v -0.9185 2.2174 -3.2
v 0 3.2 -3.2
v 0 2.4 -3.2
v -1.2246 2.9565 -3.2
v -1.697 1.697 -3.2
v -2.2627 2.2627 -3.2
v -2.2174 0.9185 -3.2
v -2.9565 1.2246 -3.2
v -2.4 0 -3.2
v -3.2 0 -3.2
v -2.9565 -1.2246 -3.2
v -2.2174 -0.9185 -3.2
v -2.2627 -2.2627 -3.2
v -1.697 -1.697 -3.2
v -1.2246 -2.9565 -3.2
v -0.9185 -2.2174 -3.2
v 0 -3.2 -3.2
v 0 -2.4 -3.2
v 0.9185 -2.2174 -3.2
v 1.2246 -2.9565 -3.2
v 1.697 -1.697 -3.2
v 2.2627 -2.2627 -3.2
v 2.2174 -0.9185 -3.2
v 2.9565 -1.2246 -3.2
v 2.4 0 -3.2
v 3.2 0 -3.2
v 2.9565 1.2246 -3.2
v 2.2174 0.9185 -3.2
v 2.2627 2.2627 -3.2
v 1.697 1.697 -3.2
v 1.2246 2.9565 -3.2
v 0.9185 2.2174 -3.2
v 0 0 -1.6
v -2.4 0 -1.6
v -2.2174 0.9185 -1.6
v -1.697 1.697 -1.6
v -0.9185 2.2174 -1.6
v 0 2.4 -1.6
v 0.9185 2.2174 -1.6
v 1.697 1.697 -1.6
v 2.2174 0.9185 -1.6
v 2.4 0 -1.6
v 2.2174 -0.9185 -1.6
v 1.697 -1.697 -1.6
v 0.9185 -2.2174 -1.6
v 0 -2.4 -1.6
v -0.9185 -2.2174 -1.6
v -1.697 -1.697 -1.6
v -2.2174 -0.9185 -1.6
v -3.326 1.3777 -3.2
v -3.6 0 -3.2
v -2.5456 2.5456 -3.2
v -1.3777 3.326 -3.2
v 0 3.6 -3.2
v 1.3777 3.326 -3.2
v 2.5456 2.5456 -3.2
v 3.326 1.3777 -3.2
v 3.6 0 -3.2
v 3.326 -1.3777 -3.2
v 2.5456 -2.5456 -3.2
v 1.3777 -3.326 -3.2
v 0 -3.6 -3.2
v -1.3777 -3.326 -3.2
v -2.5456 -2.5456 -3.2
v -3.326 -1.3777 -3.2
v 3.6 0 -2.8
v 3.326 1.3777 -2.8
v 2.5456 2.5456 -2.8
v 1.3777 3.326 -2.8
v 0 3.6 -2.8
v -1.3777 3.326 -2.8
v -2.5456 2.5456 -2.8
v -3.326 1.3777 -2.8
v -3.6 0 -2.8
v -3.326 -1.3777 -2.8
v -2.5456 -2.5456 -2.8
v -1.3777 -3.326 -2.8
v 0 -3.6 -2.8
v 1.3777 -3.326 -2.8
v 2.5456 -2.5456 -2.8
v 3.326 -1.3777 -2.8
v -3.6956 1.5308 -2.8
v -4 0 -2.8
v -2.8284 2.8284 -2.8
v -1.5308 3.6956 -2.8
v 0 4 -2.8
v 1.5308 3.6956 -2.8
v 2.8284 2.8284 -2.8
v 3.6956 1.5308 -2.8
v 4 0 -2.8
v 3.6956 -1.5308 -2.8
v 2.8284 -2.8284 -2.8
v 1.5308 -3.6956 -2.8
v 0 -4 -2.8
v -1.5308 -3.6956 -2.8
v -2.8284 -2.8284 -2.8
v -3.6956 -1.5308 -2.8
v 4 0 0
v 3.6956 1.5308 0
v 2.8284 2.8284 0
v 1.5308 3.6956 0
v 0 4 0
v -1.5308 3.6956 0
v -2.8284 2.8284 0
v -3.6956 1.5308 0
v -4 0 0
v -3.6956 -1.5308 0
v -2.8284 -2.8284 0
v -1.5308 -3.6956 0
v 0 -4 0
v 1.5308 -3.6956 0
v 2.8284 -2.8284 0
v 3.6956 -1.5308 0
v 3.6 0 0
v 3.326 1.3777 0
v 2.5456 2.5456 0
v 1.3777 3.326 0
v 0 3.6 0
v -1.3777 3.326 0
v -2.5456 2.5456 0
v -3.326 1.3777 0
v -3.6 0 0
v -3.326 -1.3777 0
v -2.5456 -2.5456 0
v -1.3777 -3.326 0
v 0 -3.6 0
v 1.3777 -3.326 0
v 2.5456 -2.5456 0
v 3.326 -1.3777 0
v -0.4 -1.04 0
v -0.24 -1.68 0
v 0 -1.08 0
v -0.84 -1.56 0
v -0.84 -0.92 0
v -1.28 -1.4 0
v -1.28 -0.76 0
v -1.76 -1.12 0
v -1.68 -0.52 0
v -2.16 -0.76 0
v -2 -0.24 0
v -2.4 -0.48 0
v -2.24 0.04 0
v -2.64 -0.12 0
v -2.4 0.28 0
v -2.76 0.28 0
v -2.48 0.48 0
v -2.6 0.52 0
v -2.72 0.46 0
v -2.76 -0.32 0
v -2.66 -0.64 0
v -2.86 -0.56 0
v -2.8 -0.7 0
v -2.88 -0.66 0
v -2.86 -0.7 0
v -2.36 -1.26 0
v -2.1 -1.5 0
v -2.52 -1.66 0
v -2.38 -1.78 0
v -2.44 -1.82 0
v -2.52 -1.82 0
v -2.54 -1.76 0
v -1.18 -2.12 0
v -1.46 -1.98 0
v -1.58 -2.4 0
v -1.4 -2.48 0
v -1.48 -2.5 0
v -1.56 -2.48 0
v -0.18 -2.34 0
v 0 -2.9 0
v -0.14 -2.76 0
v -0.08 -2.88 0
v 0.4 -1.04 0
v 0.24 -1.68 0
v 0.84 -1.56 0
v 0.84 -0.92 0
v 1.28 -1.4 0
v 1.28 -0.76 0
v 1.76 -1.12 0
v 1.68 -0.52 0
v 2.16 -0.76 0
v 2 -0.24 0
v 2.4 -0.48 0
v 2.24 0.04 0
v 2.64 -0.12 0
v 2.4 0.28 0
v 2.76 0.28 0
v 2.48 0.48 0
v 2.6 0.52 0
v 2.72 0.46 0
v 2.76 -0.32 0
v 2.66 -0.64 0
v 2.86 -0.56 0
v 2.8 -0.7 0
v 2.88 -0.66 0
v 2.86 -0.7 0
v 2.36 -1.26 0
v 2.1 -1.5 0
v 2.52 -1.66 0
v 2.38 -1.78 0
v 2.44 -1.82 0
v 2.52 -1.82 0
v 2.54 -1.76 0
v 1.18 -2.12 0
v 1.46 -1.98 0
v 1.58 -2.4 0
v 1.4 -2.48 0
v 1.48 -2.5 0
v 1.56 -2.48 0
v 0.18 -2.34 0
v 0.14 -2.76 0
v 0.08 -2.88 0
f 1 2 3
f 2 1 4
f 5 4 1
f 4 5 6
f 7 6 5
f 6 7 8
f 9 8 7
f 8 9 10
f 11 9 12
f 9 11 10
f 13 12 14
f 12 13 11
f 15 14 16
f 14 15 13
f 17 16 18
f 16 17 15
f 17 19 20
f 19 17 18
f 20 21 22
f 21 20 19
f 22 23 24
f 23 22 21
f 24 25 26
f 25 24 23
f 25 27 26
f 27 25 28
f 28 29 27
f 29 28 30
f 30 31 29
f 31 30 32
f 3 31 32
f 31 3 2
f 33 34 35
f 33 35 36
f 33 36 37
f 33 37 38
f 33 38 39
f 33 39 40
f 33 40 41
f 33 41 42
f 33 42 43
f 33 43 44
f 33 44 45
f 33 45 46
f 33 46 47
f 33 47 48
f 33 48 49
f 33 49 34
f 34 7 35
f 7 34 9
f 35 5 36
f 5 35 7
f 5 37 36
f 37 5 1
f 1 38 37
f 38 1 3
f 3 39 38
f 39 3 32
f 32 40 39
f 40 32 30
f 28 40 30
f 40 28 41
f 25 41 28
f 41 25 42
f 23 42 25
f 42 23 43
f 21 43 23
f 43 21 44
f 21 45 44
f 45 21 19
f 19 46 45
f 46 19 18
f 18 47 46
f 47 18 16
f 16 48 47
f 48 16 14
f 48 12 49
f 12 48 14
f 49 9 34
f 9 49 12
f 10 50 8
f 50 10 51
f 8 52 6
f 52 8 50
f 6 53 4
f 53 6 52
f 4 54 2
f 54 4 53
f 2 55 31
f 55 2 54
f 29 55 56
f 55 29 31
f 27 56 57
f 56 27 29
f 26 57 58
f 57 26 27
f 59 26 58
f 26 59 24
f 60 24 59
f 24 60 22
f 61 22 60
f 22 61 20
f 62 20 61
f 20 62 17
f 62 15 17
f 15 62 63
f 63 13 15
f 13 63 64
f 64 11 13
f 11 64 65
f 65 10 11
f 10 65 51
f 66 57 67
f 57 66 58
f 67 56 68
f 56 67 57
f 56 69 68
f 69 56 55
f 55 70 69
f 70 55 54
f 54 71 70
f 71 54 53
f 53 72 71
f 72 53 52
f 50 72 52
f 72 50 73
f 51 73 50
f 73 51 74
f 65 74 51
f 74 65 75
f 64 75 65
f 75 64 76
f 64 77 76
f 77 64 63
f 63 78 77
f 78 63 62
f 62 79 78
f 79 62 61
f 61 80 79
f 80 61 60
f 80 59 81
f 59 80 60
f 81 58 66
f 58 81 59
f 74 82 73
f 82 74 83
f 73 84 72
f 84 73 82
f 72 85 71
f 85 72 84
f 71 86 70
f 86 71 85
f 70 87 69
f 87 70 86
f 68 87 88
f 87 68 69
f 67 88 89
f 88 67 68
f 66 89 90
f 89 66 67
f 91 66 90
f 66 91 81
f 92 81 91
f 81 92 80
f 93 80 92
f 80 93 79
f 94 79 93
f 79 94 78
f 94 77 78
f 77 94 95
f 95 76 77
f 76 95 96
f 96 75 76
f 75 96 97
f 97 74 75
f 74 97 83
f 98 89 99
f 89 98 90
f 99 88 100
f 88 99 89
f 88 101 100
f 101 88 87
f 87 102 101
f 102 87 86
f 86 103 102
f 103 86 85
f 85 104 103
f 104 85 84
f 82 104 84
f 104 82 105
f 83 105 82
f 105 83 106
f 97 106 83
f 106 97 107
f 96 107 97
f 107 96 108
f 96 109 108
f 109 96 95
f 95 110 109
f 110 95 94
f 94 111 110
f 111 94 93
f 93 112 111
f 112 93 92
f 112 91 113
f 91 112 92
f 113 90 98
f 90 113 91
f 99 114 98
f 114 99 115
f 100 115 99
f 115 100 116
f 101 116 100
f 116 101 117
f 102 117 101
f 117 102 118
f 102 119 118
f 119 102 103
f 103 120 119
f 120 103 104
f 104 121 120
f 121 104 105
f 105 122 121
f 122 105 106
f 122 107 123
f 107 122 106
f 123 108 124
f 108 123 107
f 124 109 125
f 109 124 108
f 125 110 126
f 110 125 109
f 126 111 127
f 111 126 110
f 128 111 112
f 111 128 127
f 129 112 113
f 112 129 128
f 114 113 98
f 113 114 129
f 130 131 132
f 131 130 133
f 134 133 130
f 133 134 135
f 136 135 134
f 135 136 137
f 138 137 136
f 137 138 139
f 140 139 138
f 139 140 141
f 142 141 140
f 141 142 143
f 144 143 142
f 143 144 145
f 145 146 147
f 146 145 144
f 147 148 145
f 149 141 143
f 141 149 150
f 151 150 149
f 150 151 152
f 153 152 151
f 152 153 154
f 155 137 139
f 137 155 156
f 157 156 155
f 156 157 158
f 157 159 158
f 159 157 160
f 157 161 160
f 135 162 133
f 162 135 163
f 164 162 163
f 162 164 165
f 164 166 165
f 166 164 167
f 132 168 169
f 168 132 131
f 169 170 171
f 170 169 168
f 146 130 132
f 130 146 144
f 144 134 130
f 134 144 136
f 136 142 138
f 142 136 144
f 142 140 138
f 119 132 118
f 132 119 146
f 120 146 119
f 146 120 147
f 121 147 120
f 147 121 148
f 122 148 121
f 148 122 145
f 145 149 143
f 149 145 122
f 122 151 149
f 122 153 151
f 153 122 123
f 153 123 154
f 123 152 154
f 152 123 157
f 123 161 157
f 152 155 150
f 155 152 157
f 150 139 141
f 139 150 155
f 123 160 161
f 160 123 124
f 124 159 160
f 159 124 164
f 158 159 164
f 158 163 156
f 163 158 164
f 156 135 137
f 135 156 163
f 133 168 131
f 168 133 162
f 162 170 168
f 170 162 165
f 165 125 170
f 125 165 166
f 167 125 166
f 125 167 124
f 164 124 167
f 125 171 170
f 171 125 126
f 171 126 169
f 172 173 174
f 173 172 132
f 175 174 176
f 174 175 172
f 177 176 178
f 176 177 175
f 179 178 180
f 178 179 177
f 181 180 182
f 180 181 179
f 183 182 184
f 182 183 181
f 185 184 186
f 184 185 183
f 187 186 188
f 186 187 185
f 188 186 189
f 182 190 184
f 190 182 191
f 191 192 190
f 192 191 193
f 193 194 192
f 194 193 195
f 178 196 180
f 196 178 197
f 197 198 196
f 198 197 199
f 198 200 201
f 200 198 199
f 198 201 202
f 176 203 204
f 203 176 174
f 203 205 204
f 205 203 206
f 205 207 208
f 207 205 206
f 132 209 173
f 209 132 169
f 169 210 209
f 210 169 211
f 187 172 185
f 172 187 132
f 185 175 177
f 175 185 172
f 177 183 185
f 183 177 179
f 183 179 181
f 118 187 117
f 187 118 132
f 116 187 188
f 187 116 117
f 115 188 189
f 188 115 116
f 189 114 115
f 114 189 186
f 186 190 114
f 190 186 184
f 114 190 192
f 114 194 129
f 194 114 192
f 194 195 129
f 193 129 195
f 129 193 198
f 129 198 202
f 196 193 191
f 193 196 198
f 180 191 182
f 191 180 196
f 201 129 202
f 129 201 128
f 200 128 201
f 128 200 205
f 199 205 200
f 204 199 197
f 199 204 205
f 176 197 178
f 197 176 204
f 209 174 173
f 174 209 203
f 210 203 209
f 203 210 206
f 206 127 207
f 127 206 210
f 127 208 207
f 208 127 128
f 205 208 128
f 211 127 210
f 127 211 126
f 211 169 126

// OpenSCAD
use <../lib.scad>
use <../p/4-4ering.scad>
use <s/98138s01.scad>
$fa=1; $fs=0.2;
function ldraw_lib__98138p0c(realsolid=false) = [
// 0 Tile  1 x  1 Round with Eye Closed Pattern
// 0 Name: 98138p0c.dat
// 0 Author: Philippe Hurbain [Philo]
// 0 !LDRAW_ORG Part UPDATE 2015-01
// 0 !LICENSE Licensed under CC BY 2.0 and CC BY 4.0 : see CAreadme.txt
// 
// 0 BFC CERTIFY CCW
  [0,"BFC","CERTIFY"],
  [0,"BFC","CCW"],
// 
// 0 !KEYWORDS Eyelash
// 
// 0 !HISTORY 2015-10-11 [PTadmin] Official Update 2015-01
// 
// 
// 1 16 0 0 0 1 0 0 0 1 0 0 0 1 s\98138s01.dat
  [1,16,0,0,0,1,0,0,0,1,0,0,0,1, ldraw_lib__s__98138s01(realsolid)],
// 1 16 0 0 0 9 0 0 0 1 0 0 0 9 4-4ering.dat
  [1,16,0,0,0,9,0,0,0,1,0,0,0,9, ldraw_lib__4_4ering(realsolid)],
// 4 0 -0.6 0 -4.2 0 0 -2.7 -1 0 -2.6 -2.1 0 -3.9
  [4,0,-0.6,0,-4.2,0,0,-2.7,-1,0,-2.6,-2.1,0,-3.9],
// 4 0 -2.1 0 -3.9 -1 0 -2.6 -2.1 0 -2.3 -3.2 0 -3.5
  [4,0,-2.1,0,-3.9,-1,0,-2.6,-2.1,0,-2.3,-3.2,0,-3.5],
// 4 0 -3.2 0 -3.5 -2.1 0 -2.3 -3.2 0 -1.9 -4.4 0 -2.8
  [4,0,-3.2,0,-3.5,-2.1,0,-2.3,-3.2,0,-1.9,-4.4,0,-2.8],
// 4 0 -4.4 0 -2.8 -3.2 0 -1.9 -4.2 0 -1.3 -5.4 0 -1.9
  [4,0,-4.4,0,-2.8,-3.2,0,-1.9,-4.2,0,-1.3,-5.4,0,-1.9],
// 4 0 -5.4 0 -1.9 -4.2 0 -1.3 -5 0 -0.6 -6 0 -1.2
  [4,0,-5.4,0,-1.9,-4.2,0,-1.3,-5,0,-0.6,-6,0,-1.2],
// 4 0 -6 0 -1.2 -5 0 -0.6 -5.6 0 0.1 -6.6 0 -0.3
  [4,0,-6,0,-1.2,-5,0,-0.6,-5.6,0,0.1,-6.6,0,-0.3],
// 4 0 -6.6 0 -0.3 -5.6 0 0.1 -6 0 0.7 -6.9 0 0.7
  [4,0,-6.6,0,-0.3,-5.6,0,0.1,-6,0,0.7,-6.9,0,0.7],
// 4 0 -6.9 0 0.7 -6 0 0.7 -6.2 0 1.2 -6.5 0 1.3
  [4,0,-6.9,0,0.7,-6,0,0.7,-6.2,0,1.2,-6.5,0,1.3],
// 3 0 -6.5 0 1.3 -6.8 0 1.15 -6.9 0 0.7
  [3,0,-6.5,0,1.3,-6.8,0,1.15,-6.9,0,0.7],
// 4 0 -6 0 -1.2 -6.6 0 -0.3 -6.9 0 -0.8 -6.65 0 -1.6
  [4,0,-6,0,-1.2,-6.6,0,-0.3,-6.9,0,-0.8,-6.65,0,-1.6],
// 4 0 -6.65 0 -1.6 -6.9 0 -0.8 -7.15 0 -1.4 -7 0 -1.75
  [4,0,-6.65,0,-1.6,-6.9,0,-0.8,-7.15,0,-1.4,-7,0,-1.75],
// 4 0 -7 0 -1.75 -7.15 0 -1.4 -7.2 0 -1.65 -7.15 0 -1.75
  [4,0,-7,0,-1.75,-7.15,0,-1.4,-7.2,0,-1.65,-7.15,0,-1.75],
// 4 0 -4.4 0 -2.8 -5.4 0 -1.9 -5.9 0 -3.15 -5.25 0 -3.75
  [4,0,-4.4,0,-2.8,-5.4,0,-1.9,-5.9,0,-3.15,-5.25,0,-3.75],
// 4 0 -5.25 0 -3.75 -5.9 0 -3.15 -6.3 0 -4.15 -5.95 0 -4.45
  [4,0,-5.25,0,-3.75,-5.9,0,-3.15,-6.3,0,-4.15,-5.95,0,-4.45],
// 4 0 -6.1 0 -4.55 -5.95 0 -4.45 -6.3 0 -4.15 -6.3 0 -4.55
  [4,0,-6.1,0,-4.55,-5.95,0,-4.45,-6.3,0,-4.15,-6.3,0,-4.55],
// 3 0 -6.3 0 -4.15 -6.35 0 -4.4 -6.3 0 -4.55
  [3,0,-6.3,0,-4.15,-6.35,0,-4.4,-6.3,0,-4.55],
// 4 0 -2.1 0 -3.9 -3.2 0 -3.5 -3.65 0 -4.95 -2.95 0 -5.3
  [4,0,-2.1,0,-3.9,-3.2,0,-3.5,-3.65,0,-4.95,-2.95,0,-5.3],
// 4 0 -2.95 0 -5.3 -3.65 0 -4.95 -3.95 0 -6 -3.5 0 -6.2
  [4,0,-2.95,0,-5.3,-3.65,0,-4.95,-3.95,0,-6,-3.5,0,-6.2],
// 4 0 -3.7 0 -6.25 -3.5 0 -6.2 -3.95 0 -6 -3.9 0 -6.2
  [4,0,-3.7,0,-6.25,-3.5,0,-6.2,-3.95,0,-6,-3.9,0,-6.2],
// 4 0 0 0 -2.7 -0.6 0 -4.2 -0.45 0 -5.85 0 0 -7.25
  [4,0,0,0,-2.7,-0.6,0,-4.2,-0.45,0,-5.85,0,0,-7.25],
// 4 0 -0.2 0 -7.2 0 0 -7.25 -0.45 0 -5.85 -0.35 0 -6.9
  [4,0,-0.2,0,-7.2,0,0,-7.25,-0.45,0,-5.85,-0.35,0,-6.9],
// 4 16 0 0 -2.7 -6.2 0 1.2 -6 0 0.7 -1 0 -2.6
  [4,16,0,0,-2.7,-6.2,0,1.2,-6,0,0.7,-1,0,-2.6],
// 4 16 -2.1 0 -2.3 -1 0 -2.6 -6 0 0.7 -3.2 0 -1.9
  [4,16,-2.1,0,-2.3,-1,0,-2.6,-6,0,0.7,-3.2,0,-1.9],
// 4 16 -4.2 0 -1.3 -3.2 0 -1.9 -6 0 0.7 -5.6 0 0.1
  [4,16,-4.2,0,-1.3,-3.2,0,-1.9,-6,0,0.7,-5.6,0,0.1],
// 3 16 -5.6 0 0.1 -5 0 -0.6 -4.2 0 -1.3
  [3,16,-5.6,0,0.1,-5,0,-0.6,-4.2,0,-1.3],
// 4 16 -6.2 0 1.2 0 0 -2.7 0 0 9 -3.4443 0 8.3151
  [4,16,-6.2,0,1.2,0,0,-2.7,0,0,9,-3.4443,0,8.3151],
// 4 16 -6.2 0 1.2 -3.4443 0 8.3151 -6.3639 0 6.3639 -6.5 0 1.3
  [4,16,-6.2,0,1.2,-3.4443,0,8.3151,-6.3639,0,6.3639,-6.5,0,1.3],
// 4 16 -6.5 0 1.3 -6.3639 0 6.3639 -8.3151 0 3.4443 -6.8 0 1.15
  [4,16,-6.5,0,1.3,-6.3639,0,6.3639,-8.3151,0,3.4443,-6.8,0,1.15],
// 4 16 -6.9 0 0.7 -6.8 0 1.15 -8.3151 0 3.4443 -9 0 0
  [4,16,-6.9,0,0.7,-6.8,0,1.15,-8.3151,0,3.4443,-9,0,0],
// 4 16 -6.9 0 0.7 -9 0 0 -6.9 0 -0.8 -6.6 0 -0.3
  [4,16,-6.9,0,0.7,-9,0,0,-6.9,0,-0.8,-6.6,0,-0.3],
// 3 16 -9 0 0 -7.15 0 -1.4 -6.9 0 -0.8
  [3,16,-9,0,0,-7.15,0,-1.4,-6.9,0,-0.8],
// 4 16 -7.2 0 -1.65 -7.15 0 -1.4 -9 0 0 -8.3151 0 -3.4443
  [4,16,-7.2,0,-1.65,-7.15,0,-1.4,-9,0,0,-8.3151,0,-3.4443],
// 3 16 -7.2 0 -1.65 -8.3151 0 -3.4443 -7.15 0 -1.75
  [3,16,-7.2,0,-1.65,-8.3151,0,-3.4443,-7.15,0,-1.75],
// 4 16 -7 0 -1.75 -7.15 0 -1.75 -8.3151 0 -3.4443 -6.3 0 -4.15
  [4,16,-7,0,-1.75,-7.15,0,-1.75,-8.3151,0,-3.4443,-6.3,0,-4.15],
// 3 16 -8.3151 0 -3.4443 -6.35 0 -4.4 -6.3 0 -4.15
  [3,16,-8.3151,0,-3.4443,-6.35,0,-4.4,-6.3,0,-4.15],
// 4 16 -7 0 -1.75 -6.3 0 -4.15 -5.9 0 -3.15 -6.65 0 -1.6
  [4,16,-7,0,-1.75,-6.3,0,-4.15,-5.9,0,-3.15,-6.65,0,-1.6],
// 4 16 -6.65 0 -1.6 -5.9 0 -3.15 -5.4 0 -1.9 -6 0 -1.2
  [4,16,-6.65,0,-1.6,-5.9,0,-3.15,-5.4,0,-1.9,-6,0,-1.2],
// 4 16 -6.3 0 -4.55 -6.35 0 -4.4 -8.3151 0 -3.4443 -6.3639 0 -6.3639
  [4,16,-6.3,0,-4.55,-6.35,0,-4.4,-8.3151,0,-3.4443,-6.3639,0,-6.3639],
// 4 16 -6.1 0 -4.55 -6.3 0 -4.55 -6.3639 0 -6.3639 -3.95 0 -6
  [4,16,-6.1,0,-4.55,-6.3,0,-4.55,-6.3639,0,-6.3639,-3.95,0,-6],
// 3 16 -5.95 0 -4.45 -6.1 0 -4.55 -3.95 0 -6
  [3,16,-5.95,0,-4.45,-6.1,0,-4.55,-3.95,0,-6],
// 4 16 -5.25 0 -3.75 -5.95 0 -4.45 -3.95 0 -6 -3.65 0 -4.95
  [4,16,-5.25,0,-3.75,-5.95,0,-4.45,-3.95,0,-6,-3.65,0,-4.95],
// 4 16 -4.4 0 -2.8 -5.25 0 -3.75 -3.65 0 -4.95 -3.2 0 -3.5
  [4,16,-4.4,0,-2.8,-5.25,0,-3.75,-3.65,0,-4.95,-3.2,0,-3.5],
// 4 16 -0.6 0 -4.2 -2.1 0 -3.9 -2.95 0 -5.3 -0.45 0 -5.85
  [4,16,-0.6,0,-4.2,-2.1,0,-3.9,-2.95,0,-5.3,-0.45,0,-5.85],
// 4 16 -0.35 0 -6.9 -0.45 0 -5.85 -2.95 0 -5.3 -3.5 0 -6.2
  [4,16,-0.35,0,-6.9,-0.45,0,-5.85,-2.95,0,-5.3,-3.5,0,-6.2],
// 4 16 -3.4443 0 -8.3151 -0.35 0 -6.9 -3.5 0 -6.2 -3.7 0 -6.25
  [4,16,-3.4443,0,-8.3151,-0.35,0,-6.9,-3.5,0,-6.2,-3.7,0,-6.25],
// 4 16 -3.4443 0 -8.3151 -3.7 0 -6.25 -3.9 0 -6.2 -6.3639 0 -6.3639
  [4,16,-3.4443,0,-8.3151,-3.7,0,-6.25,-3.9,0,-6.2,-6.3639,0,-6.3639],
// 3 16 -3.95 0 -6 -6.3639 0 -6.3639 -3.9 0 -6.2
  [3,16,-3.95,0,-6,-6.3639,0,-6.3639,-3.9,0,-6.2],
// 4 16 -0.2 0 -7.2 -0.35 0 -6.9 -3.4443 0 -8.3151 0 0 -9
  [4,16,-0.2,0,-7.2,-0.35,0,-6.9,-3.4443,0,-8.3151,0,0,-9],
// 3 16 -0.2 0 -7.2 0 0 -9 0 0 -7.25
  [3,16,-0.2,0,-7.2,0,0,-9,0,0,-7.25],
// 4 0 1 0 -2.6 0 0 -2.7 0.6 0 -4.2 2.1 0 -3.9
  [4,0,1,0,-2.6,0,0,-2.7,0.6,0,-4.2,2.1,0,-3.9],
// 4 0 2.1 0 -2.3 1 0 -2.6 2.1 0 -3.9 3.2 0 -3.5
  [4,0,2.1,0,-2.3,1,0,-2.6,2.1,0,-3.9,3.2,0,-3.5],
// 4 0 3.2 0 -1.9 2.1 0 -2.3 3.2 0 -3.5 4.4 0 -2.8
  [4,0,3.2,0,-1.9,2.1,0,-2.3,3.2,0,-3.5,4.4,0,-2.8],
// 4 0 4.2 0 -1.3 3.2 0 -1.9 4.4 0 -2.8 5.4 0 -1.9
  [4,0,4.2,0,-1.3,3.2,0,-1.9,4.4,0,-2.8,5.4,0,-1.9],
// 4 0 5 0 -0.6 4.2 0 -1.3 5.4 0 -1.9 6 0 -1.2
  [4,0,5,0,-0.6,4.2,0,-1.3,5.4,0,-1.9,6,0,-1.2],
// 4 0 5.6 0 0.1 5 0 -0.6 6 0 -1.2 6.6 0 -0.3
  [4,0,5.6,0,0.1,5,0,-0.6,6,0,-1.2,6.6,0,-0.3],
// 4 0 6 0 0.7 5.6 0 0.1 6.6 0 -0.3 6.9 0 0.7
  [4,0,6,0,0.7,5.6,0,0.1,6.6,0,-0.3,6.9,0,0.7],
// 4 0 6.2 0 1.2 6 0 0.7 6.9 0 0.7 6.5 0 1.3
  [4,0,6.2,0,1.2,6,0,0.7,6.9,0,0.7,6.5,0,1.3],
// 3 0 6.5 0 1.3 6.9 0 0.7 6.8 0 1.15
  [3,0,6.5,0,1.3,6.9,0,0.7,6.8,0,1.15],
// 4 0 6.9 0 -0.8 6.6 0 -0.3 6 0 -1.2 6.65 0 -1.6
  [4,0,6.9,0,-0.8,6.6,0,-0.3,6,0,-1.2,6.65,0,-1.6],
// 4 0 7.15 0 -1.4 6.9 0 -0.8 6.65 0 -1.6 7 0 -1.75
  [4,0,7.15,0,-1.4,6.9,0,-0.8,6.65,0,-1.6,7,0,-1.75],
// 4 0 7.2 0 -1.65 7.15 0 -1.4 7 0 -1.75 7.15 0 -1.75
  [4,0,7.2,0,-1.65,7.15,0,-1.4,7,0,-1.75,7.15,0,-1.75],
// 4 0 5.9 0 -3.15 5.4 0 -1.9 4.4 0 -2.8 5.25 0 -3.75
  [4,0,5.9,0,-3.15,5.4,0,-1.9,4.4,0,-2.8,5.25,0,-3.75],
// 4 0 6.3 0 -4.15 5.9 0 -3.15 5.25 0 -3.75 5.95 0 -4.45
  [4,0,6.3,0,-4.15,5.9,0,-3.15,5.25,0,-3.75,5.95,0,-4.45],
// 4 0 6.3 0 -4.15 5.95 0 -4.45 6.1 0 -4.55 6.3 0 -4.55
  [4,0,6.3,0,-4.15,5.95,0,-4.45,6.1,0,-4.55,6.3,0,-4.55],
// 3 0 6.3 0 -4.15 6.3 0 -4.55 6.35 0 -4.4
  [3,0,6.3,0,-4.15,6.3,0,-4.55,6.35,0,-4.4],
// 4 0 3.65 0 -4.95 3.2 0 -3.5 2.1 0 -3.9 2.95 0 -5.3
  [4,0,3.65,0,-4.95,3.2,0,-3.5,2.1,0,-3.9,2.95,0,-5.3],
// 4 0 3.95 0 -6 3.65 0 -4.95 2.95 0 -5.3 3.5 0 -6.2
  [4,0,3.95,0,-6,3.65,0,-4.95,2.95,0,-5.3,3.5,0,-6.2],
// 4 0 3.95 0 -6 3.5 0 -6.2 3.7 0 -6.25 3.9 0 -6.2
  [4,0,3.95,0,-6,3.5,0,-6.2,3.7,0,-6.25,3.9,0,-6.2],
// 4 0 0.45 0 -5.85 0.6 0 -4.2 0 0 -2.7 0 0 -7.25
  [4,0,0.45,0,-5.85,0.6,0,-4.2,0,0,-2.7,0,0,-7.25],
// 4 0 0.45 0 -5.85 0 0 -7.25 0.2 0 -7.2 0.35 0 -6.9
  [4,0,0.45,0,-5.85,0,0,-7.25,0.2,0,-7.2,0.35,0,-6.9],
// 4 16 6 0 0.7 6.2 0 1.2 0 0 -2.7 1 0 -2.6
  [4,16,6,0,0.7,6.2,0,1.2,0,0,-2.7,1,0,-2.6],
// 4 16 6 0 0.7 1 0 -2.6 2.1 0 -2.3 3.2 0 -1.9
  [4,16,6,0,0.7,1,0,-2.6,2.1,0,-2.3,3.2,0,-1.9],
// 4 16 6 0 0.7 3.2 0 -1.9 4.2 0 -1.3 5.6 0 0.1
  [4,16,6,0,0.7,3.2,0,-1.9,4.2,0,-1.3,5.6,0,0.1],
// 3 16 5.6 0 0.1 4.2 0 -1.3 5 0 -0.6
  [3,16,5.6,0,0.1,4.2,0,-1.3,5,0,-0.6],
// 4 16 0 0 9 0 0 -2.7 6.2 0 1.2 3.4443 0 8.3151
  [4,16,0,0,9,0,0,-2.7,6.2,0,1.2,3.4443,0,8.3151],
// 4 16 6.3639 0 6.3639 3.4443 0 8.3151 6.2 0 1.2 6.5 0 1.3
  [4,16,6.3639,0,6.3639,3.4443,0,8.3151,6.2,0,1.2,6.5,0,1.3],
// 4 16 8.3151 0 3.4443 6.3639 0 6.3639 6.5 0 1.3 6.8 0 1.15
  [4,16,8.3151,0,3.4443,6.3639,0,6.3639,6.5,0,1.3,6.8,0,1.15],
// 4 16 8.3151 0 3.4443 6.8 0 1.15 6.9 0 0.7 9 0 0
  [4,16,8.3151,0,3.4443,6.8,0,1.15,6.9,0,0.7,9,0,0],
// 4 16 6.9 0 -0.8 9 0 0 6.9 0 0.7 6.6 0 -0.3
  [4,16,6.9,0,-0.8,9,0,0,6.9,0,0.7,6.6,0,-0.3],
// 3 16 9 0 0 6.9 0 -0.8 7.15 0 -1.4
  [3,16,9,0,0,6.9,0,-0.8,7.15,0,-1.4],
// 4 16 9 0 0 7.15 0 -1.4 7.2 0 -1.65 8.3151 0 -3.4443
  [4,16,9,0,0,7.15,0,-1.4,7.2,0,-1.65,8.3151,0,-3.4443],
// 3 16 7.2 0 -1.65 7.15 0 -1.75 8.3151 0 -3.4443
  [3,16,7.2,0,-1.65,7.15,0,-1.75,8.3151,0,-3.4443],
// 4 16 8.3151 0 -3.4443 7.15 0 -1.75 7 0 -1.75 6.3 0 -4.15
  [4,16,8.3151,0,-3.4443,7.15,0,-1.75,7,0,-1.75,6.3,0,-4.15],
// 3 16 8.3151 0 -3.4443 6.3 0 -4.15 6.35 0 -4.4
  [3,16,8.3151,0,-3.4443,6.3,0,-4.15,6.35,0,-4.4],
// 4 16 5.9 0 -3.15 6.3 0 -4.15 7 0 -1.75 6.65 0 -1.6
  [4,16,5.9,0,-3.15,6.3,0,-4.15,7,0,-1.75,6.65,0,-1.6],
// 4 16 5.4 0 -1.9 5.9 0 -3.15 6.65 0 -1.6 6 0 -1.2
  [4,16,5.4,0,-1.9,5.9,0,-3.15,6.65,0,-1.6,6,0,-1.2],
// 4 16 8.3151 0 -3.4443 6.35 0 -4.4 6.3 0 -4.55 6.3639 0 -6.3639
  [4,16,8.3151,0,-3.4443,6.35,0,-4.4,6.3,0,-4.55,6.3639,0,-6.3639],
// 4 16 6.3639 0 -6.3639 6.3 0 -4.55 6.1 0 -4.55 3.95 0 -6
  [4,16,6.3639,0,-6.3639,6.3,0,-4.55,6.1,0,-4.55,3.95,0,-6],
// 3 16 5.95 0 -4.45 3.95 0 -6 6.1 0 -4.55
  [3,16,5.95,0,-4.45,3.95,0,-6,6.1,0,-4.55],
// 4 16 3.95 0 -6 5.95 0 -4.45 5.25 0 -3.75 3.65 0 -4.95
  [4,16,3.95,0,-6,5.95,0,-4.45,5.25,0,-3.75,3.65,0,-4.95],
// 4 16 3.65 0 -4.95 5.25 0 -3.75 4.4 0 -2.8 3.2 0 -3.5
  [4,16,3.65,0,-4.95,5.25,0,-3.75,4.4,0,-2.8,3.2,0,-3.5],
// 4 16 2.95 0 -5.3 2.1 0 -3.9 0.6 0 -4.2 0.45 0 -5.85
  [4,16,2.95,0,-5.3,2.1,0,-3.9,0.6,0,-4.2,0.45,0,-5.85],
// 4 16 2.95 0 -5.3 0.45 0 -5.85 0.35 0 -6.9 3.5 0 -6.2
  [4,16,2.95,0,-5.3,0.45,0,-5.85,0.35,0,-6.9,3.5,0,-6.2],
// 4 16 3.5 0 -6.2 0.35 0 -6.9 3.4443 0 -8.3151 3.7 0 -6.25
  [4,16,3.5,0,-6.2,0.35,0,-6.9,3.4443,0,-8.3151,3.7,0,-6.25],
// 4 16 3.9 0 -6.2 3.7 0 -6.25 3.4443 0 -8.3151 6.3639 0 -6.3639
  [4,16,3.9,0,-6.2,3.7,0,-6.25,3.4443,0,-8.3151,6.3639,0,-6.3639],
// 3 16 3.95 0 -6 3.9 0 -6.2 6.3639 0 -6.3639
  [3,16,3.95,0,-6,3.9,0,-6.2,6.3639,0,-6.3639],
// 4 16 3.4443 0 -8.3151 0.35 0 -6.9 0.2 0 -7.2 0 0 -9
  [4,16,3.4443,0,-8.3151,0.35,0,-6.9,0.2,0,-7.2,0,0,-9],
// 3 16 0.2 0 -7.2 0 0 -7.25 0 0 -9
  [3,16,0.2,0,-7.2,0,0,-7.25,0,0,-9],
];
module ldraw_lib__98138p0c(step=0, col=false, unit=2/5, alt=false, line=0.2, solid=!$preview)
    makepoly(ldraw_lib__98138p0c(solid), step=step, col=col, unit=unit, alt=alt, line=line, solid=solid);
ldraw_lib__98138p0c(line=0.2);
